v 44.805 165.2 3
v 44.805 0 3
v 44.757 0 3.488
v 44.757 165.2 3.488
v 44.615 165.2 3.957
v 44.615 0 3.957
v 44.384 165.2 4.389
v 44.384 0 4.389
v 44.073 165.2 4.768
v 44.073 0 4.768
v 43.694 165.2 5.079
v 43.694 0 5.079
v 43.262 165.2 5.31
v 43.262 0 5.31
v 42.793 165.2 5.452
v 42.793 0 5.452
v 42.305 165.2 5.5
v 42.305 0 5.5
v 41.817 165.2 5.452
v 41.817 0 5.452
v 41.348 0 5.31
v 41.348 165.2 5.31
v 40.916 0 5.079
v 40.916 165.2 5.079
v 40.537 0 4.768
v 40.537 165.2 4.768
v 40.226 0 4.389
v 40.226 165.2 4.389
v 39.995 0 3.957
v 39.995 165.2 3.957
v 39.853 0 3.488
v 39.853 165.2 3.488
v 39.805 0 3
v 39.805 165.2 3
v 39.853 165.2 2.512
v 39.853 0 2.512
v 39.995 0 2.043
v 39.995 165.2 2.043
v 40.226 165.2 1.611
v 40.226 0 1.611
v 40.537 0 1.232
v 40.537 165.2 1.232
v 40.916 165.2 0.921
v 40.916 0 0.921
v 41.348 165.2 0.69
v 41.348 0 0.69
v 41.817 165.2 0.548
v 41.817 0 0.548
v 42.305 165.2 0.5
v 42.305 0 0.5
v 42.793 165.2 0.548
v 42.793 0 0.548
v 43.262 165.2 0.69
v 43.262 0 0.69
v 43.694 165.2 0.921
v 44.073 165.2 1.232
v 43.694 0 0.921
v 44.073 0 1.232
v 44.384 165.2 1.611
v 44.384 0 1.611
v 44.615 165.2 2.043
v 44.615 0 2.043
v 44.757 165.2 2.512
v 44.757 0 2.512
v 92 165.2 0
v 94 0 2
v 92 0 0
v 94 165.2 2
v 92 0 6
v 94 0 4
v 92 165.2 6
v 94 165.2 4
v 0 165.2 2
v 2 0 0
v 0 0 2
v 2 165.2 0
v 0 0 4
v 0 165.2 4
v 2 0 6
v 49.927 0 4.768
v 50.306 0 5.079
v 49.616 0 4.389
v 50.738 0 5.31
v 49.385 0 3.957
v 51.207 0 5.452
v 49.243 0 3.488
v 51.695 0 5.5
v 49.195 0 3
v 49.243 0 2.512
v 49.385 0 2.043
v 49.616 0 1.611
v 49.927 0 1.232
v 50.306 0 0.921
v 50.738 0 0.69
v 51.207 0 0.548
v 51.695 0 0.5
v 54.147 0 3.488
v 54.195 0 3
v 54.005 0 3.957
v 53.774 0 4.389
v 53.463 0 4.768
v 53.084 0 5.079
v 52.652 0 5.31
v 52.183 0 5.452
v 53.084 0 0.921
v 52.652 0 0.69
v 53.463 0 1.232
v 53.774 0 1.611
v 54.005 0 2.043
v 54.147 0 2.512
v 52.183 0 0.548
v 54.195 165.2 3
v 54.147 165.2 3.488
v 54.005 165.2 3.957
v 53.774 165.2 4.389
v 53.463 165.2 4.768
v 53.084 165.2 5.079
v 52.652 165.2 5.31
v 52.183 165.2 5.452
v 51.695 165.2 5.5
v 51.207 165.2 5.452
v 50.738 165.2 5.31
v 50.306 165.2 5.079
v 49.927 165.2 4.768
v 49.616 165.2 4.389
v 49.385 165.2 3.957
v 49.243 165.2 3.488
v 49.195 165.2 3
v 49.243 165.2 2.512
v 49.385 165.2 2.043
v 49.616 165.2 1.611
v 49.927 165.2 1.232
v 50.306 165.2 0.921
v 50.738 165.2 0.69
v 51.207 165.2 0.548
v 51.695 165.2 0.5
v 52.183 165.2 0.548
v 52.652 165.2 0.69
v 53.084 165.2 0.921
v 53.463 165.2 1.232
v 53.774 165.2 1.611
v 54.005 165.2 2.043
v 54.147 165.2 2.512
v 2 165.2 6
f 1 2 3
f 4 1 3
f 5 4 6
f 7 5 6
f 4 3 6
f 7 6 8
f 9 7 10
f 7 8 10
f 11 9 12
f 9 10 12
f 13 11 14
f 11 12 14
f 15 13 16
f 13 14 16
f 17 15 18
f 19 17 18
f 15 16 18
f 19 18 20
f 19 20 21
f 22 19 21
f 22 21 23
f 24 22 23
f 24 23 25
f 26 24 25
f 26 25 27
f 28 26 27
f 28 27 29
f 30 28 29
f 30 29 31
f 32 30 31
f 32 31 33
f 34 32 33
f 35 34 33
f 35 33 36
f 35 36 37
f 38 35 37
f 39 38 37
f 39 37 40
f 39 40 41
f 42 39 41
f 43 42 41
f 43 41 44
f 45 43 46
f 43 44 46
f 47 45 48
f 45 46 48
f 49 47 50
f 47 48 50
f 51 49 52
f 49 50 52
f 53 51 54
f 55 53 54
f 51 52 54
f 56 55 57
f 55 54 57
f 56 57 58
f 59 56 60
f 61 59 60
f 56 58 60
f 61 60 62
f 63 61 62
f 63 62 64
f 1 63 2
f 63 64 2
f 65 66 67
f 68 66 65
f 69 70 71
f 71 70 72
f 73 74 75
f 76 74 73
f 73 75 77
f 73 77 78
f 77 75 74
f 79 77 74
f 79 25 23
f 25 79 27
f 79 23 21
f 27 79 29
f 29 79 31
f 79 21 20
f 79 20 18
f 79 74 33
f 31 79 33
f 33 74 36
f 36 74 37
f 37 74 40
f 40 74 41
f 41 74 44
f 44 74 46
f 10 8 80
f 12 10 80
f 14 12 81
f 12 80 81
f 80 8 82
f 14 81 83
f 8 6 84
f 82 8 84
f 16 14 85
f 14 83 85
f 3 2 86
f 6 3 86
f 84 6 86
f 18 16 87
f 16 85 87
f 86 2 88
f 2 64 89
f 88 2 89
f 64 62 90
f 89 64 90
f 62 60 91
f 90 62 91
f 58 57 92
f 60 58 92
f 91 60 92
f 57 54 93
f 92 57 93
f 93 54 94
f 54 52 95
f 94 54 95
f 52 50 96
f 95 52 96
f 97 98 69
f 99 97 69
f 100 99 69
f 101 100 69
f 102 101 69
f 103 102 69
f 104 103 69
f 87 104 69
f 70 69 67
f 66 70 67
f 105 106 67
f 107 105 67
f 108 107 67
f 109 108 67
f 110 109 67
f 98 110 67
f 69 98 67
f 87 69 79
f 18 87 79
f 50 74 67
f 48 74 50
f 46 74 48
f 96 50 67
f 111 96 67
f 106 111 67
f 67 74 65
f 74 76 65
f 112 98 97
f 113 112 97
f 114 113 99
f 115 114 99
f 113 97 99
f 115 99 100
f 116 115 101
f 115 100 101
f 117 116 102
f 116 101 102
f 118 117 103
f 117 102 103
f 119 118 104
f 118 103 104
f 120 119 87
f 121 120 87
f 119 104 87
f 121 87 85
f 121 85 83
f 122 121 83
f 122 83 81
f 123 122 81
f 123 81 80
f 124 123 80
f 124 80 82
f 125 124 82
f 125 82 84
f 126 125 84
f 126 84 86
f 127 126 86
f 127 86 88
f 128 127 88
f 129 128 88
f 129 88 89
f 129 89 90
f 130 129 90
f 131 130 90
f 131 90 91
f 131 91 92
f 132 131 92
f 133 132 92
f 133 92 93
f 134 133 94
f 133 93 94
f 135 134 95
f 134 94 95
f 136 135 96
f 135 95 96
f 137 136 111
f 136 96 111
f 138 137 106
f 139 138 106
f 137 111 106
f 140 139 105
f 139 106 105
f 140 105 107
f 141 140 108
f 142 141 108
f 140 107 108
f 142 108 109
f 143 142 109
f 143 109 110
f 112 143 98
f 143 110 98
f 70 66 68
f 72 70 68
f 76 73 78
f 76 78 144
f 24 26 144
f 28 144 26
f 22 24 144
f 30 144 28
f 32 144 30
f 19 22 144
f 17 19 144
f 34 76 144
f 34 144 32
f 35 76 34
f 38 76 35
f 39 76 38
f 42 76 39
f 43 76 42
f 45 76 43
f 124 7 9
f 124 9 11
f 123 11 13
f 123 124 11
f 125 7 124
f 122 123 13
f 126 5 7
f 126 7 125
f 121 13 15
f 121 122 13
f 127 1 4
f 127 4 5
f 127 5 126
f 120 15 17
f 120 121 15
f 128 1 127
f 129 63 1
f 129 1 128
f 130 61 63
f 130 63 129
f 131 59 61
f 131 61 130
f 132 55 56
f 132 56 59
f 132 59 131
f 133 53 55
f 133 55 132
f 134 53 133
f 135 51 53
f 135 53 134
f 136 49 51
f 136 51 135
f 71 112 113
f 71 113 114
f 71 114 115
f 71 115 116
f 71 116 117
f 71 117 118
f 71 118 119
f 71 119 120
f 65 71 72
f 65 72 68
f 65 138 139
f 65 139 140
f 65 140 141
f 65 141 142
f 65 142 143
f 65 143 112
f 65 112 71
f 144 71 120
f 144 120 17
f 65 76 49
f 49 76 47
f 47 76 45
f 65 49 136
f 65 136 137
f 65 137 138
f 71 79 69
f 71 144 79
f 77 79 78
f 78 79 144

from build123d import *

# Parameters (mm, degrees)
F0_W     = 94
F0_H     = 165.2
F1_DEPTH = 6
F2_R     = 2.5
F3_DEPTH = 165.201
F4_SIZE  = 2


with BuildPart() as f1:
    # F0 (on Top) → F1 (new body)
    with BuildSketch(Plane.XY):
        with Locations((47, 82.6)):
            Rectangle(F0_W, F0_H)
    extrude(amount=F1_DEPTH)

    # F2 (on face) → F3 (cut, through all)
    with BuildSketch(Plane.XZ):
        with Locations((42.305, 3)):
            Circle(F2_R)
        with Locations((51.695, 3)):
            Circle(F2_R)
    extrude(amount=-F3_DEPTH, mode=Mode.SUBTRACT)

    # F4
    f4_edges = [f1.edges().sort_by_distance(p)[0] for p in [
        (0, 82.6, 6),
        (0, 82.6, 0),
        (94, 82.6, 6),
        (94, 82.6, 0),
    ]]
    chamfer(f4_edges, length=F4_SIZE)


solid = f1.part
